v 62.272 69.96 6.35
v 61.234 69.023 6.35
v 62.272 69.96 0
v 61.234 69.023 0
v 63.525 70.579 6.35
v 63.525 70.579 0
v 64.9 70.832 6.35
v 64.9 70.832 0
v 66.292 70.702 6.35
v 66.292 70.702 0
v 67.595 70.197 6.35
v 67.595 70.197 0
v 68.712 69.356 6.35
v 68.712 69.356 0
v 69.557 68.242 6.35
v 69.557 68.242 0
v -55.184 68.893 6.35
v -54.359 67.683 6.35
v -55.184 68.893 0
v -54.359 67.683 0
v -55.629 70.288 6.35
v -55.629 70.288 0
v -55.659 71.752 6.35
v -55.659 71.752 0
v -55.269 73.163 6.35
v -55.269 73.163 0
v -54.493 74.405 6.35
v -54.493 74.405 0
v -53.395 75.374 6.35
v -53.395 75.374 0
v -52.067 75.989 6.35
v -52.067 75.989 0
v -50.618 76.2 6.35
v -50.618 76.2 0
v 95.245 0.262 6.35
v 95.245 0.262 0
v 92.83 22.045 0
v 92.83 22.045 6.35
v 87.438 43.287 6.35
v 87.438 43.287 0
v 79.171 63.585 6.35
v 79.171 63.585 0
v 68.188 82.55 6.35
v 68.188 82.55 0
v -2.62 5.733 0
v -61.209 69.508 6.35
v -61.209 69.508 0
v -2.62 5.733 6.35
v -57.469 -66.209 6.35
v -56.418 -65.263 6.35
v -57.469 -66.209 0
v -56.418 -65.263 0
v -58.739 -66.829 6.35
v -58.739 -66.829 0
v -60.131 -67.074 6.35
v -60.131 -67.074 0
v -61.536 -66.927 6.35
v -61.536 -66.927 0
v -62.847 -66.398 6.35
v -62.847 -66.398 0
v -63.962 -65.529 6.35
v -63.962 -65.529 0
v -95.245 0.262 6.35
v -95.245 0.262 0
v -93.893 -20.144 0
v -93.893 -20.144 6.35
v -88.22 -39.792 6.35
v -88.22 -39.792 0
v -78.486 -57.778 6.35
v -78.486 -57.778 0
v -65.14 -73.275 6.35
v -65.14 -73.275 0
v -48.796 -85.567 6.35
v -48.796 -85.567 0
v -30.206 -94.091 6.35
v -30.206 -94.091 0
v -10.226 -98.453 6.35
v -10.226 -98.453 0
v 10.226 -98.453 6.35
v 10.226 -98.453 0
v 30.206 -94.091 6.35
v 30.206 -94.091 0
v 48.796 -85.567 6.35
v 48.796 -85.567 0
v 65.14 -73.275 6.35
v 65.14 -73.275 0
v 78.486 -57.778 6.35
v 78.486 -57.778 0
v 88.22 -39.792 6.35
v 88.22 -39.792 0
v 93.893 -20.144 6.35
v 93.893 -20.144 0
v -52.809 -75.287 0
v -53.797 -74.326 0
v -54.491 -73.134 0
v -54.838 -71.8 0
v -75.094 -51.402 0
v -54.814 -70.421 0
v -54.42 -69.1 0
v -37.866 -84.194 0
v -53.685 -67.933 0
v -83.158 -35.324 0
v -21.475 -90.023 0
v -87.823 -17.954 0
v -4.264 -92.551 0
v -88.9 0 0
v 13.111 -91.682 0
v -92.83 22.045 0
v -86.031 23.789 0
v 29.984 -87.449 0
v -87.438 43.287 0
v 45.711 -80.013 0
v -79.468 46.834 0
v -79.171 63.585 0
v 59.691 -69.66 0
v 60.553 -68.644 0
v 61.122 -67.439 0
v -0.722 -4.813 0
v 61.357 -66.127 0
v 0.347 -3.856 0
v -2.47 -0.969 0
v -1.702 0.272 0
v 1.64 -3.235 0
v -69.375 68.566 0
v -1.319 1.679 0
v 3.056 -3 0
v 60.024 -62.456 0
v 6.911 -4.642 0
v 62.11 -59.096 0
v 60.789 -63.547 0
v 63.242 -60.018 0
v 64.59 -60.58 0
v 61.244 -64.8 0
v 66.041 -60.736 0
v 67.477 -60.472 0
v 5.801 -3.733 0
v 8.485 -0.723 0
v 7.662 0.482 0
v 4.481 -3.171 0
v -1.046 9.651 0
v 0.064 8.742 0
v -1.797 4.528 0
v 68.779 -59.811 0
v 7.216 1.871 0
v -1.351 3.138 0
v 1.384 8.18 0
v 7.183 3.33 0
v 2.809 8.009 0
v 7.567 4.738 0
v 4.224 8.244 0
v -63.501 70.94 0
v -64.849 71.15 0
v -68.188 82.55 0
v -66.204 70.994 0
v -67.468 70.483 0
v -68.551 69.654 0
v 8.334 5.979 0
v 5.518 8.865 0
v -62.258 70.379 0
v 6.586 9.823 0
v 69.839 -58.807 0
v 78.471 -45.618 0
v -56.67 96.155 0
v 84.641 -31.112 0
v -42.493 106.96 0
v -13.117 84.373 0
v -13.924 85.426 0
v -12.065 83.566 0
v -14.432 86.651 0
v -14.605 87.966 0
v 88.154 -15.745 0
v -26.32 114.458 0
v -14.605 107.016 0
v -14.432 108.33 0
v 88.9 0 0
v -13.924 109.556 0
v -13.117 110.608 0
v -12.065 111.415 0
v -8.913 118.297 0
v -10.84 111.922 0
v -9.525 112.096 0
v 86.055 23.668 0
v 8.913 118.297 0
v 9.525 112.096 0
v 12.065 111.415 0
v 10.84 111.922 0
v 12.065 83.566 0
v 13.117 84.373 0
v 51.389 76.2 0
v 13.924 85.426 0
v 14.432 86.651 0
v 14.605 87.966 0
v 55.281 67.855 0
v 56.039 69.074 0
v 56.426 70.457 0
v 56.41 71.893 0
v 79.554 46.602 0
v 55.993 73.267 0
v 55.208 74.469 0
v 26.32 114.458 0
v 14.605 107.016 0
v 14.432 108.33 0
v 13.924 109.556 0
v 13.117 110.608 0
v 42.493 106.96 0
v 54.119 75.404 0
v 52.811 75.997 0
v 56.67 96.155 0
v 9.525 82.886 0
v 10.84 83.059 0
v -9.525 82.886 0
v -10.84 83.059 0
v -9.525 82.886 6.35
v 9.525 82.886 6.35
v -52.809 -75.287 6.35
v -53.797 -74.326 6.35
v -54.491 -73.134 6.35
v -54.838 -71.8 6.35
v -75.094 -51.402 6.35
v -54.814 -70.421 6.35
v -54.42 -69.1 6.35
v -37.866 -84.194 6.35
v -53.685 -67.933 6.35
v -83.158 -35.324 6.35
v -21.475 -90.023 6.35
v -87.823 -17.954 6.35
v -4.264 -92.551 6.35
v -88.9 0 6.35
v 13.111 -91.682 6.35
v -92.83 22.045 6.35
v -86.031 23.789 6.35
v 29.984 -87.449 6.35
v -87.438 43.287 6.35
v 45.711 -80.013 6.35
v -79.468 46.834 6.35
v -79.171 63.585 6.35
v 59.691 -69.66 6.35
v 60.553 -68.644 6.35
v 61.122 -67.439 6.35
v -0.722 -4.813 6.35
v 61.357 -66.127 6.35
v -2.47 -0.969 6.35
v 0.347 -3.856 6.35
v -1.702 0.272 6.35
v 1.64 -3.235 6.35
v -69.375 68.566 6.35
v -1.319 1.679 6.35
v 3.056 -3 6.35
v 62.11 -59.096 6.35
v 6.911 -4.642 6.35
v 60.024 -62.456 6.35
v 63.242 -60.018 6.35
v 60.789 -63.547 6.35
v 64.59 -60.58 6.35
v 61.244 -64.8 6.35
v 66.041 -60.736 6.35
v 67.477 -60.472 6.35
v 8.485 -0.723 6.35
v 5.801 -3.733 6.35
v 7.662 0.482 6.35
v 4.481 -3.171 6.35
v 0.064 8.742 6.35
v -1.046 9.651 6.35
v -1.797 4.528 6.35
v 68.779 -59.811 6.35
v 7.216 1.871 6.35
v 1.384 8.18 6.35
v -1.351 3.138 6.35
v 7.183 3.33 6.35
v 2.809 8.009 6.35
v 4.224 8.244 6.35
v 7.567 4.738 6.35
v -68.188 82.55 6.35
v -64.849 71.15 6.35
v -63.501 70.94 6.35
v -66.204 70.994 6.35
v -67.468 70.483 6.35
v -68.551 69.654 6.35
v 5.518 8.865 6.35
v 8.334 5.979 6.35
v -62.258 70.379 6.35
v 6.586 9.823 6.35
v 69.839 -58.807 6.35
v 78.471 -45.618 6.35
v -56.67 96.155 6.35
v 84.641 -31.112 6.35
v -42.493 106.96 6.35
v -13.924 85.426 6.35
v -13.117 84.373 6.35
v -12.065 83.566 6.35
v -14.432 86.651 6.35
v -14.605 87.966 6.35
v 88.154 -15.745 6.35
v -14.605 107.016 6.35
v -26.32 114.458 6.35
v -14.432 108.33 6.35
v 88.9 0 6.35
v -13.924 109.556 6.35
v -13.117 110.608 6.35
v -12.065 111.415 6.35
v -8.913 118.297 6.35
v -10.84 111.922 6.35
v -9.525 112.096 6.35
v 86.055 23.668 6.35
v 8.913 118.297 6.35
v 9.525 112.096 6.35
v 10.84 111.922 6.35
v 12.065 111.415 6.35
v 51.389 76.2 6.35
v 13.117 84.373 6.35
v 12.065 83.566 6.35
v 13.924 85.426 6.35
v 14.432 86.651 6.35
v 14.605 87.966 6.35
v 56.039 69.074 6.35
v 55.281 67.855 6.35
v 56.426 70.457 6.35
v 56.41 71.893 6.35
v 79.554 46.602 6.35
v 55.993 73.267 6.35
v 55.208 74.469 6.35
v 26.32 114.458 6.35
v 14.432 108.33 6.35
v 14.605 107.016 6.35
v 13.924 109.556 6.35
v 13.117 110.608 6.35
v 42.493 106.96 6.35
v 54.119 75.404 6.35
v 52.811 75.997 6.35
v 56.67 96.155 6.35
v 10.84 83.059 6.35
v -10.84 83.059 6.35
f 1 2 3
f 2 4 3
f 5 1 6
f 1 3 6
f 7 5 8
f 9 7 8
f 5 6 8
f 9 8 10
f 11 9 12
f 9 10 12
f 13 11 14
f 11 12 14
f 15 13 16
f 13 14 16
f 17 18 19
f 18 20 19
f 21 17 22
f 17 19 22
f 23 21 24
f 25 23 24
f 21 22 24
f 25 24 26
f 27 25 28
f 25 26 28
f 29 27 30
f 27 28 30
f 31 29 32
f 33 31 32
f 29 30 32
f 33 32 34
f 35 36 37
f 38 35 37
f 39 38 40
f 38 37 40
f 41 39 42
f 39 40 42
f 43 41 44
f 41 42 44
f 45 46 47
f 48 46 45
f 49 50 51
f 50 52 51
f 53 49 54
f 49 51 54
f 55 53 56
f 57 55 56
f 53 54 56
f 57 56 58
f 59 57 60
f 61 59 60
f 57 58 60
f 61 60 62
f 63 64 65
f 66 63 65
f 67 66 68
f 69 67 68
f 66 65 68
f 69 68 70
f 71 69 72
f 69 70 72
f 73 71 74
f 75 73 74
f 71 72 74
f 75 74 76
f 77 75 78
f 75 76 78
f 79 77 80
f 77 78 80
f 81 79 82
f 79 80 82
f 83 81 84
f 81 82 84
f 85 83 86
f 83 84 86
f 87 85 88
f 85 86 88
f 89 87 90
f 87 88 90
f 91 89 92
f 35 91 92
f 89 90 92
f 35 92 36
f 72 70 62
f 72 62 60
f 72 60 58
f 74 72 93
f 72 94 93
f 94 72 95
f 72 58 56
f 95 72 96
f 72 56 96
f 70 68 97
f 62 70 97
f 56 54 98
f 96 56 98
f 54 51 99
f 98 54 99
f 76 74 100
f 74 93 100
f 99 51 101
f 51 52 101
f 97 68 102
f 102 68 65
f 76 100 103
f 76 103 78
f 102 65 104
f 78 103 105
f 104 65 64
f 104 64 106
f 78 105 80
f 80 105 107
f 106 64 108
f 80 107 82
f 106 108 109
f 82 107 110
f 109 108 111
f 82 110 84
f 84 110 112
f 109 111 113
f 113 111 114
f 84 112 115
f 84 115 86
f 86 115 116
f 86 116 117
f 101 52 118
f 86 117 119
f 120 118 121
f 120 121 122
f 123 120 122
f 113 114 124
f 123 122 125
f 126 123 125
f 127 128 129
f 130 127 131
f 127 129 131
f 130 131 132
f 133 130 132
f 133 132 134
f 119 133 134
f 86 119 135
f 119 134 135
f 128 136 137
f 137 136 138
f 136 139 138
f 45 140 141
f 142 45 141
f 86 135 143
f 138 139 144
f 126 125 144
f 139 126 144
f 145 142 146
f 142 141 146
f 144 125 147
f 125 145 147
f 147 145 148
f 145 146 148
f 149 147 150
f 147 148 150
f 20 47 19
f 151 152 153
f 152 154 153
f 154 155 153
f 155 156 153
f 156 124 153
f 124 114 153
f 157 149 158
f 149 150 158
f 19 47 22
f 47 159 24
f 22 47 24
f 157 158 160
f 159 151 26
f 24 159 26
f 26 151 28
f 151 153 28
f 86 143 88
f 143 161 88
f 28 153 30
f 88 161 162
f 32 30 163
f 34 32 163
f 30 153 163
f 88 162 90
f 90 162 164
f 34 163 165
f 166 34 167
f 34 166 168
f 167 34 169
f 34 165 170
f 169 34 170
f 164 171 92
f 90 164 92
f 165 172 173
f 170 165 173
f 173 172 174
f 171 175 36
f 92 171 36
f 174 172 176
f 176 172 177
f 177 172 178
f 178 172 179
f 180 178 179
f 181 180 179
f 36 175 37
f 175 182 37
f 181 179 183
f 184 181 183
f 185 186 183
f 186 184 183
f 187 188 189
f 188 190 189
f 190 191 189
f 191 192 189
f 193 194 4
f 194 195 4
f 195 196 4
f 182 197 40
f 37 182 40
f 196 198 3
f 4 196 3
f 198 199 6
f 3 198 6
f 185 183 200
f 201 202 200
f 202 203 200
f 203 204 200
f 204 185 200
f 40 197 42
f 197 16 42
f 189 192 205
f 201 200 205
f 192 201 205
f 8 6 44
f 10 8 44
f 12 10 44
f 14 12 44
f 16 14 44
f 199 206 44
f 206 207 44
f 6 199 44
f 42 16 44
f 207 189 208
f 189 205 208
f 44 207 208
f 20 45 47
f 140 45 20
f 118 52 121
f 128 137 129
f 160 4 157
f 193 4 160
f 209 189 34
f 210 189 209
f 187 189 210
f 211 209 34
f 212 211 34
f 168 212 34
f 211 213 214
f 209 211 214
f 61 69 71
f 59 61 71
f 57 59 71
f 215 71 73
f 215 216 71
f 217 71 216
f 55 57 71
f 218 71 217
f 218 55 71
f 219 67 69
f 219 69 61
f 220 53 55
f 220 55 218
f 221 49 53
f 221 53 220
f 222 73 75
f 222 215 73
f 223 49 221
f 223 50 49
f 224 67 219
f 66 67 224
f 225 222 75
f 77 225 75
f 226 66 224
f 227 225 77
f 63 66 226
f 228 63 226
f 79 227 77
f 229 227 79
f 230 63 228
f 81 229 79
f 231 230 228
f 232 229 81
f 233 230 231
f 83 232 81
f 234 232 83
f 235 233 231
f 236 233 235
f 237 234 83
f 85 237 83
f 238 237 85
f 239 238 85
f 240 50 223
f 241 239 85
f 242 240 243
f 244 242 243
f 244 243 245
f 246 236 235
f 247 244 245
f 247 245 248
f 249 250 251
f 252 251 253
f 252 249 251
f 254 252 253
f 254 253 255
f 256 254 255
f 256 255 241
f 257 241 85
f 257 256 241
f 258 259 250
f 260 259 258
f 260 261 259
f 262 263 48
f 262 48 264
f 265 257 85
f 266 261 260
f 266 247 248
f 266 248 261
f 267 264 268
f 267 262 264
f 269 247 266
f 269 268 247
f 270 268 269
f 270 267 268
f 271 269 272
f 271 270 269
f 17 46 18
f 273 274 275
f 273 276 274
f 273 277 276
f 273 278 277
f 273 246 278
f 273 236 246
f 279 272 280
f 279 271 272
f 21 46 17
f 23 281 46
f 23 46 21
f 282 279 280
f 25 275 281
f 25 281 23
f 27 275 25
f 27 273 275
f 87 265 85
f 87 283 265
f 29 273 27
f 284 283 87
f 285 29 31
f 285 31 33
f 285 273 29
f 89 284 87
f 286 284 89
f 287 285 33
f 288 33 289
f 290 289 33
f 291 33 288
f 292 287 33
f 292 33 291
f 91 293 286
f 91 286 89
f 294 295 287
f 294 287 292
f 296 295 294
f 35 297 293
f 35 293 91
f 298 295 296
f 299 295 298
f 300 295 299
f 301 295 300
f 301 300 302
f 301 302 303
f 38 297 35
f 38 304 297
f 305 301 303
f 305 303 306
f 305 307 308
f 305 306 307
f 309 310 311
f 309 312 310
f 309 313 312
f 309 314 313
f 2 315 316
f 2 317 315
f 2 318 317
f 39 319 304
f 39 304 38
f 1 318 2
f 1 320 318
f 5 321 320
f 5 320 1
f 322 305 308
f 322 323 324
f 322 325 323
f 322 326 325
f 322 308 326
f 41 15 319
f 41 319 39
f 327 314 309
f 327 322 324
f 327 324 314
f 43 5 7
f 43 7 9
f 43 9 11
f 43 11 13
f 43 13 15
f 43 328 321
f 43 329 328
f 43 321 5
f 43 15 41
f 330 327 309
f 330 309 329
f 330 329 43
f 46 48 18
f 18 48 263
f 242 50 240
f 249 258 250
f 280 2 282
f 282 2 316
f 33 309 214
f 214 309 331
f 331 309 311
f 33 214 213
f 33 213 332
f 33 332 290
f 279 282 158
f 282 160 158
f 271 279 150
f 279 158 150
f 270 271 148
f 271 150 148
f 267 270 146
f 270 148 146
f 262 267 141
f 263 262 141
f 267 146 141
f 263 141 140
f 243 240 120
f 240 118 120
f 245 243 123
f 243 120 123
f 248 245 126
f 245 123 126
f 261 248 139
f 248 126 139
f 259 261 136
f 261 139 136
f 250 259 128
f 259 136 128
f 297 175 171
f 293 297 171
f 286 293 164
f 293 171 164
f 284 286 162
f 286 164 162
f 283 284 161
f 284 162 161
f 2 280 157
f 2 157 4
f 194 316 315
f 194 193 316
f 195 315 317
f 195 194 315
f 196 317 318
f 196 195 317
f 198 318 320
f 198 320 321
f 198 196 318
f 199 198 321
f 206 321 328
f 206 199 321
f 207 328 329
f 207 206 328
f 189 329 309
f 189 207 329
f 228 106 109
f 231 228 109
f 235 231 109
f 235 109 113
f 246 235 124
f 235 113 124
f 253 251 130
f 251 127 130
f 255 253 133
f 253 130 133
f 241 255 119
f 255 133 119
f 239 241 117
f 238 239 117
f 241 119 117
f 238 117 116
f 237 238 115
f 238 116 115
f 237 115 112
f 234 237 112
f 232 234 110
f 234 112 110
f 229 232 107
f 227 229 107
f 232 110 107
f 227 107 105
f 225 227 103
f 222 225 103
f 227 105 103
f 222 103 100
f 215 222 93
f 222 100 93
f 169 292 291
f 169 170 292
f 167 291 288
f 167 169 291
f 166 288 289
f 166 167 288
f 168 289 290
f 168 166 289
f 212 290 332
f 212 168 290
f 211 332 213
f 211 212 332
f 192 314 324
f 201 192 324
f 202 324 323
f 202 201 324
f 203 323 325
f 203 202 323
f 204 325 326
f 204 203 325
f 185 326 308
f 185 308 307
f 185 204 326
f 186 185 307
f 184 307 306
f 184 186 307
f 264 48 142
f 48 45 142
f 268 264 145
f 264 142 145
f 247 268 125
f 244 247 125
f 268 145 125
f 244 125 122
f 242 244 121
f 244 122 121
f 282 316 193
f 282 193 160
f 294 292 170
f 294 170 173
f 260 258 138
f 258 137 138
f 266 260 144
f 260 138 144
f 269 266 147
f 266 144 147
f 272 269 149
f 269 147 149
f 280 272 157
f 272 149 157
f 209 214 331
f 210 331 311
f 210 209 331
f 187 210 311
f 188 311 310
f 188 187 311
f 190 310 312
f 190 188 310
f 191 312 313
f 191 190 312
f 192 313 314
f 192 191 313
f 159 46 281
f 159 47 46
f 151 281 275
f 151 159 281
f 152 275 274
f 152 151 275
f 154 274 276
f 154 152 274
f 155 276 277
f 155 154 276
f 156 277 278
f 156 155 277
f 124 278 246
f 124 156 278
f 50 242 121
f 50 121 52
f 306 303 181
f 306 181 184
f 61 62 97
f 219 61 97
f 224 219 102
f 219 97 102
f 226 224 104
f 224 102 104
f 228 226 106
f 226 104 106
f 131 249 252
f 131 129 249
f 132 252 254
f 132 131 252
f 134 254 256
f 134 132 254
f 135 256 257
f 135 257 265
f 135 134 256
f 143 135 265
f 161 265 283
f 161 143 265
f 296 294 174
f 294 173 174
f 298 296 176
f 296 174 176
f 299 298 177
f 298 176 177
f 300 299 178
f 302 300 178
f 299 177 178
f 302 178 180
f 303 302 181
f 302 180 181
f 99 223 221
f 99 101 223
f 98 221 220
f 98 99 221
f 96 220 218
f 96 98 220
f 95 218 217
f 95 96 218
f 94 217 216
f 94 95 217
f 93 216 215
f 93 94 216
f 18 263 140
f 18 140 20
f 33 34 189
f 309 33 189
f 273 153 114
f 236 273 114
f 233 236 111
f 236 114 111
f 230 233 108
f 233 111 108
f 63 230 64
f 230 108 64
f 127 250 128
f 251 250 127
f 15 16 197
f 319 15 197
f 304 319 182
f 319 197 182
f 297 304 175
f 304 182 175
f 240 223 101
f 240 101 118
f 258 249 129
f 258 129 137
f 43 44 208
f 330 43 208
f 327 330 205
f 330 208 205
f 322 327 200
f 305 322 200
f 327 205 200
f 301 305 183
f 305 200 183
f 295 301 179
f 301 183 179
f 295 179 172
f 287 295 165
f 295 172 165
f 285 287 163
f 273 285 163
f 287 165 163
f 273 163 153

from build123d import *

# Parameters (mm, degrees)
BOSS_EXTRUDE1_DEPTH = 6.35
CUT_EXTRUDE1_REACH  = 8.35
SKETCH2_W           = 29.21
SKETCH2_H           = 29.21
FILLET1_R           = 5.08
BOSS_EXTRUDE2_DEPTH = 6.35
FILLET2_R           = 5.08


with BuildPart() as part:
    # Sketch1 → Boss-Extrude1 (new body)
    with BuildSketch(Plane.XY):
        with BuildLine():
            ThreePointArc((-68.188405154, 82.55), (-87.437503618, 43.287282526), (-95.244575115, 0.262424481))
            ThreePointArc((-95.244575115, 0.262424481), (0, -99.003097439), (95.244575115, 0.262424481))
            ThreePointArc((95.244575115, 0.262424481), (87.437503618, 43.287282526), (68.188405154, 82.55))
            ThreePointArc((68.188405154, 82.55), (0, 118.781058361), (-68.188405154, 82.55))
        make_face()
        with BuildLine():
            Line((-64.77, 76.2), (64.77, 76.2))
            ThreePointArc((64.77, 76.2), (81.91955238, 39.710108254), (88.9, 0))
            ThreePointArc((88.9, 0), (0, -92.653098722), (-88.9, 0))
            ThreePointArc((-88.9, 0), (-81.91955238, 39.710108254), (-64.77, 76.2))
        make_face(mode=Mode.SUBTRACT)
    extrude(amount=BOSS_EXTRUDE1_DEPTH)

    # Sketch2 → Cut-Extrude1 (cut, up to next)
    with BuildSketch(Plane.XY.offset(6.35), mode=Mode.PRIVATE) as cut_extrude1_sk1:
        with Locations((0, 97.49052918)):
            Rectangle(SKETCH2_W, SKETCH2_H)
    cut_extrude1_tool1 = extrude(cut_extrude1_sk1.sketch, amount=-CUT_EXTRUDE1_REACH, mode=Mode.PRIVATE) & part.part
    add(cut_extrude1_tool1.solids().sort_by_distance((0, 97.490529, 6.35))[0], mode=Mode.SUBTRACT)

    # Fillet1
    fillet1_edges = [part.edges().sort_by_distance(p)[0] for p in [
        (14.605, 112.09552918, 3.175),
        (14.605, 82.88552918, 3.175),
        (-14.605, 82.88552918, 3.175),
        (-14.605, 112.09552918, 3.175),
    ]]
    fillet(fillet1_edges, radius=FILLET1_R)

    # Sketch3 → Boss-Extrude2 (add)
    with BuildSketch(Plane.XY.offset(6.35)):
        with BuildLine():
            ThreePointArc((-64.77, 76.2), (-65.301178837, 75.369054935), (-65.826969345, 74.534689907))
            Line((-65.826969345, 74.534689907), (0.397744119, 2.447786681))
            Line((0.397744119, 2.447786681), (2.867484972, 5.391109215))
            Line((2.867484972, 5.391109215), (-62.183145491, 76.2))
            Line((-62.183145491, 76.2), (-64.77, 76.2))
        make_face()
        with BuildLine():
            Line((62.283199114, 76.2), (2.867484972, 5.391109215))
            Line((2.867484972, 5.391109215), (5.466869825, 2.561627672))
            Line((5.466869825, 2.561627672), (65.84083728, 74.512520285))
            ThreePointArc((65.84083728, 74.512520285), (65.308184865, 75.358015528), (64.77, 76.2))
            Line((64.77, 76.2), (62.283199114, 76.2))
        make_face()
        with BuildLine():
            Line((5.466869825, 2.561627672), (2.997128973, -0.381694862))
            Line((2.997128973, -0.381694862), (63.387167907, -66.117440095))
            ThreePointArc((63.387167907, -66.117440095), (64.712838285, -64.7424562), (66.008689372, -63.339333743))
            Line((66.008689372, -63.339333743), (5.466869825, 2.561627672))
        make_face()
        Polygon((2.867484972, 5.391109215), (0.397744119, 2.447786681), (2.997128973, -0.381694862), (5.466869825, 2.561627672), align=None)
        with BuildLine():
            Line((2.997128973, -0.381694862), (0.397744119, 2.447786681))
            Line((0.397744119, 2.447786681), (-59.927506787, -69.445047811))
            ThreePointArc((-59.927506787, -69.445047811), (-58.505389643, -70.713272134), (-57.056440469, -71.950751993))
            Line((-57.056440469, -71.950751993), (2.997128973, -0.381694862))
        make_face()
    extrude(amount=-BOSS_EXTRUDE2_DEPTH)

    # Fillet2
    fillet2_edges = [part.edges().sort_by_distance(p)[0] for p in [
        (0.397744119, 2.447786681, 3.175),
        (-65.826969345, 74.534689907, 3.175),
        (-62.183145491, 76.2, 3.175),
        (2.867484972, 5.391109215, 3.175),
        (62.283199114, 76.2, 3.175),
        (65.84083728, 74.512520285, 3.175),
        (5.466869825, 2.561627672, 3.175),
        (66.008689372, -63.339333743, 3.175),
        (63.387167907, -66.117440095, 3.175),
        (2.997128973, -0.381694862, 3.175),
        (-57.056440469, -71.950751993, 3.175),
        (-59.927506787, -69.445047811, 3.175),
    ]]
    fillet(fillet2_edges, radius=FILLET2_R)


solid = part.part
